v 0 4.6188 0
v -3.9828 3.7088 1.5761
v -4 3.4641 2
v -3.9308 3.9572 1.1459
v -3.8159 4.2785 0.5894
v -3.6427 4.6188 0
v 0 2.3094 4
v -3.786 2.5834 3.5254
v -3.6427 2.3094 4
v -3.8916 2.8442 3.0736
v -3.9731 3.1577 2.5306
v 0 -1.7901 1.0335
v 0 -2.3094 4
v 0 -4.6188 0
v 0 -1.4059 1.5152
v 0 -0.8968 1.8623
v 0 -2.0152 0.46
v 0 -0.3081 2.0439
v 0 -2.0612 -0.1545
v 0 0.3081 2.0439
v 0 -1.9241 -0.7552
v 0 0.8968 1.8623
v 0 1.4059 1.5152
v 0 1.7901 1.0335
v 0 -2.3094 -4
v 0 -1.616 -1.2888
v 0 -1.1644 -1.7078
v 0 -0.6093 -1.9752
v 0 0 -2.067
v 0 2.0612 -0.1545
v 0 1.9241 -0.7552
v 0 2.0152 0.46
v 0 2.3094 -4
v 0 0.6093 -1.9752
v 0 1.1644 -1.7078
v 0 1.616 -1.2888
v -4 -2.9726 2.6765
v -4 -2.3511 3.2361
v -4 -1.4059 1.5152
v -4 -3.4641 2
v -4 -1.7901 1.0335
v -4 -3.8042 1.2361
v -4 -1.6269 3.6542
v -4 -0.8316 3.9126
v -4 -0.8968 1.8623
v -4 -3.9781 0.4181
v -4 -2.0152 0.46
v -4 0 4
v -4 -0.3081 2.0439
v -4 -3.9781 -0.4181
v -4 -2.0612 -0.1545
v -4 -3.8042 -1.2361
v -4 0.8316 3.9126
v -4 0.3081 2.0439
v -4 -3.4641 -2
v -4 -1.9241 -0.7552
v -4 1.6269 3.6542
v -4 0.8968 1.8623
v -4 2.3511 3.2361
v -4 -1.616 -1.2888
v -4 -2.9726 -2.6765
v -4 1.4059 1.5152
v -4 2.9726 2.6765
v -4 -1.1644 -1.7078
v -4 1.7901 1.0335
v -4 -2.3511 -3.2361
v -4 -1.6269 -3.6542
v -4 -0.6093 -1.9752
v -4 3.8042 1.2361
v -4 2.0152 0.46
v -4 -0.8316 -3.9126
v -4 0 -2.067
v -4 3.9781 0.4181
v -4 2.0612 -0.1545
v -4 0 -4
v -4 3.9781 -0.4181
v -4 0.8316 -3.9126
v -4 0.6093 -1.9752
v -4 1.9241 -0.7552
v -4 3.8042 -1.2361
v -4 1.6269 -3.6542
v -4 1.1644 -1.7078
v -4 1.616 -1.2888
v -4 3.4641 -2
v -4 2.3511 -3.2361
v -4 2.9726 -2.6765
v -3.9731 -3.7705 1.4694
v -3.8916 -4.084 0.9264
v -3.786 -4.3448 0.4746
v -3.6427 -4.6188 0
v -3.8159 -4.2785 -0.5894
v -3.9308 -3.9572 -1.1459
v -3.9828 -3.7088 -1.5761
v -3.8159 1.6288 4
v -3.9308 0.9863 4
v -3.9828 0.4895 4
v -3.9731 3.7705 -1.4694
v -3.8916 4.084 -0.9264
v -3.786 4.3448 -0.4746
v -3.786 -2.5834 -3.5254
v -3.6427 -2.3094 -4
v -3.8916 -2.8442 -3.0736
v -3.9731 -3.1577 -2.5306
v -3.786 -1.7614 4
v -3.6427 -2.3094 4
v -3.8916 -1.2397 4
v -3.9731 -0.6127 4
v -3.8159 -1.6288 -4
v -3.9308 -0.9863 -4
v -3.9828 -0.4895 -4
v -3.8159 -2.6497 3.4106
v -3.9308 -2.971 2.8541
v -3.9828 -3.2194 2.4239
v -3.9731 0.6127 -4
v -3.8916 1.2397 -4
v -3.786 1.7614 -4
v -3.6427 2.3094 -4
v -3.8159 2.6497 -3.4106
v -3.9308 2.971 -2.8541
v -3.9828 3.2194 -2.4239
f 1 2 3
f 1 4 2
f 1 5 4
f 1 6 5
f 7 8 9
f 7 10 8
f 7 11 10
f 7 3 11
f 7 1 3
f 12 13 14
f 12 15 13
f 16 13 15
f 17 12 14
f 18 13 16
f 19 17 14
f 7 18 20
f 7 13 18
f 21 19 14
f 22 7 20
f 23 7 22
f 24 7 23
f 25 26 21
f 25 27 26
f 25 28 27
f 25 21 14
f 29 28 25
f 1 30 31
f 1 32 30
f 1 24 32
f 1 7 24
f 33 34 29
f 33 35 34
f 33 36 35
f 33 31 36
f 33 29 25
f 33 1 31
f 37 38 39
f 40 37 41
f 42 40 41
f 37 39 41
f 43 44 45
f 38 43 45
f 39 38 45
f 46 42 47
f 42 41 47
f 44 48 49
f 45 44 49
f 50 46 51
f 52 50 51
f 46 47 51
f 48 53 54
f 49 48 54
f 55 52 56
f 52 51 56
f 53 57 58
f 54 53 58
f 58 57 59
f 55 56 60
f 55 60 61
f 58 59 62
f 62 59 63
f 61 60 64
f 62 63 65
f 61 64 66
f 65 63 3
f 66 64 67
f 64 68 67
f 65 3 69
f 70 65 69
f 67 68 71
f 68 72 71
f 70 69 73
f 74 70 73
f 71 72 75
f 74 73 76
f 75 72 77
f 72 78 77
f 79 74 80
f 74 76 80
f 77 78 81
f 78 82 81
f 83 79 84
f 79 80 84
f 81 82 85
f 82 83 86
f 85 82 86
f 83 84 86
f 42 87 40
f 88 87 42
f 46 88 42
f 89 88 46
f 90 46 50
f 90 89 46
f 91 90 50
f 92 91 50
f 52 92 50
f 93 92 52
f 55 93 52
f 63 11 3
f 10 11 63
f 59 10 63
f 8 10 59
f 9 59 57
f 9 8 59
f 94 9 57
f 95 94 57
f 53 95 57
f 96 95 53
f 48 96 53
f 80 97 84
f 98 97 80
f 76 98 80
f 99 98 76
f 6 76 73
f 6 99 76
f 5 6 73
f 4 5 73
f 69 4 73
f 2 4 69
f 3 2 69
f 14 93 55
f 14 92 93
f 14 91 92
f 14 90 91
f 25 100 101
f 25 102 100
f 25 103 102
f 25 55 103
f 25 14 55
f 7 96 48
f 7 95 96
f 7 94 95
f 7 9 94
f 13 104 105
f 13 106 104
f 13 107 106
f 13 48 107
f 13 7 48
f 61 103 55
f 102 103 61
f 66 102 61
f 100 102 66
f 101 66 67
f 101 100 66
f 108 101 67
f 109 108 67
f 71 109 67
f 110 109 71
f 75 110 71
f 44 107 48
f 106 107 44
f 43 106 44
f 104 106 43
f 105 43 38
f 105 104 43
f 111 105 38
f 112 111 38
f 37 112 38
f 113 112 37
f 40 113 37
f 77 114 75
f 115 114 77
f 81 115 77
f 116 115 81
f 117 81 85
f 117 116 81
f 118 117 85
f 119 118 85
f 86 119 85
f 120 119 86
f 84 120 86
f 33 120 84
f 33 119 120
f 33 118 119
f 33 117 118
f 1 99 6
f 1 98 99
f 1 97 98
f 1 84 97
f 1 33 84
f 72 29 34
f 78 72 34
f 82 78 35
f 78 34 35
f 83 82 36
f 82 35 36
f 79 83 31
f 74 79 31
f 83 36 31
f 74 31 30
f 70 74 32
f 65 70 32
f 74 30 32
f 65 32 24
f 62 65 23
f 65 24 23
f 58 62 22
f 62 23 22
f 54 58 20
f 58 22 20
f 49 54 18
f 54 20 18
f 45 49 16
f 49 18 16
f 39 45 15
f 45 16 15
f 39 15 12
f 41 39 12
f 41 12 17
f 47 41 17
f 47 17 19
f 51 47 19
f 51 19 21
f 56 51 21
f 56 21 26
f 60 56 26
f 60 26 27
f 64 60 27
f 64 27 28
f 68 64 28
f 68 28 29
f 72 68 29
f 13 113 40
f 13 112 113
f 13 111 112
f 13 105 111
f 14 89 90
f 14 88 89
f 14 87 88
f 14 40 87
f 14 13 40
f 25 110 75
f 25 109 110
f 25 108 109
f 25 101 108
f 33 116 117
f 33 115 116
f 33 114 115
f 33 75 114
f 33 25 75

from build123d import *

# Parameters (mm, degrees)
BOSS_EXTRUDE1_DEPTH = 4
TAP1_D              = 4.134


with BuildPart() as part:
    # Sketch1 → Boss-Extrude1 (new body)
    with BuildSketch(Plane(origin=(0, 0, 0), x_dir=(0, 0, -1), z_dir=(1, 0, 0))):
        Polygon((0, 4.618802154), (-4, 2.309401077), (-4, -2.309401077), (0, -4.618802154), (4, -2.309401077), (4, 2.309401077), align=None)
    extrude(amount=-BOSS_EXTRUDE1_DEPTH)

    # Sketch2 → Cut-Revolve1 (revolve, cut)
    with BuildSketch(Plane.XY):
        Polygon((-4, 4), (-3.64273441, 4.618802154), (-4, 4.618802154), align=None)
    revolve(axis=Axis((-2.23854625, 0, 0), (1, 0, 0)), mode=Mode.SUBTRACT)

    # Tap1 (through all)
    with Locations(Plane.ZY.offset(4)):
        with Locations((0, 0)):
            Hole(TAP1_D / 2)


solid = part.part
